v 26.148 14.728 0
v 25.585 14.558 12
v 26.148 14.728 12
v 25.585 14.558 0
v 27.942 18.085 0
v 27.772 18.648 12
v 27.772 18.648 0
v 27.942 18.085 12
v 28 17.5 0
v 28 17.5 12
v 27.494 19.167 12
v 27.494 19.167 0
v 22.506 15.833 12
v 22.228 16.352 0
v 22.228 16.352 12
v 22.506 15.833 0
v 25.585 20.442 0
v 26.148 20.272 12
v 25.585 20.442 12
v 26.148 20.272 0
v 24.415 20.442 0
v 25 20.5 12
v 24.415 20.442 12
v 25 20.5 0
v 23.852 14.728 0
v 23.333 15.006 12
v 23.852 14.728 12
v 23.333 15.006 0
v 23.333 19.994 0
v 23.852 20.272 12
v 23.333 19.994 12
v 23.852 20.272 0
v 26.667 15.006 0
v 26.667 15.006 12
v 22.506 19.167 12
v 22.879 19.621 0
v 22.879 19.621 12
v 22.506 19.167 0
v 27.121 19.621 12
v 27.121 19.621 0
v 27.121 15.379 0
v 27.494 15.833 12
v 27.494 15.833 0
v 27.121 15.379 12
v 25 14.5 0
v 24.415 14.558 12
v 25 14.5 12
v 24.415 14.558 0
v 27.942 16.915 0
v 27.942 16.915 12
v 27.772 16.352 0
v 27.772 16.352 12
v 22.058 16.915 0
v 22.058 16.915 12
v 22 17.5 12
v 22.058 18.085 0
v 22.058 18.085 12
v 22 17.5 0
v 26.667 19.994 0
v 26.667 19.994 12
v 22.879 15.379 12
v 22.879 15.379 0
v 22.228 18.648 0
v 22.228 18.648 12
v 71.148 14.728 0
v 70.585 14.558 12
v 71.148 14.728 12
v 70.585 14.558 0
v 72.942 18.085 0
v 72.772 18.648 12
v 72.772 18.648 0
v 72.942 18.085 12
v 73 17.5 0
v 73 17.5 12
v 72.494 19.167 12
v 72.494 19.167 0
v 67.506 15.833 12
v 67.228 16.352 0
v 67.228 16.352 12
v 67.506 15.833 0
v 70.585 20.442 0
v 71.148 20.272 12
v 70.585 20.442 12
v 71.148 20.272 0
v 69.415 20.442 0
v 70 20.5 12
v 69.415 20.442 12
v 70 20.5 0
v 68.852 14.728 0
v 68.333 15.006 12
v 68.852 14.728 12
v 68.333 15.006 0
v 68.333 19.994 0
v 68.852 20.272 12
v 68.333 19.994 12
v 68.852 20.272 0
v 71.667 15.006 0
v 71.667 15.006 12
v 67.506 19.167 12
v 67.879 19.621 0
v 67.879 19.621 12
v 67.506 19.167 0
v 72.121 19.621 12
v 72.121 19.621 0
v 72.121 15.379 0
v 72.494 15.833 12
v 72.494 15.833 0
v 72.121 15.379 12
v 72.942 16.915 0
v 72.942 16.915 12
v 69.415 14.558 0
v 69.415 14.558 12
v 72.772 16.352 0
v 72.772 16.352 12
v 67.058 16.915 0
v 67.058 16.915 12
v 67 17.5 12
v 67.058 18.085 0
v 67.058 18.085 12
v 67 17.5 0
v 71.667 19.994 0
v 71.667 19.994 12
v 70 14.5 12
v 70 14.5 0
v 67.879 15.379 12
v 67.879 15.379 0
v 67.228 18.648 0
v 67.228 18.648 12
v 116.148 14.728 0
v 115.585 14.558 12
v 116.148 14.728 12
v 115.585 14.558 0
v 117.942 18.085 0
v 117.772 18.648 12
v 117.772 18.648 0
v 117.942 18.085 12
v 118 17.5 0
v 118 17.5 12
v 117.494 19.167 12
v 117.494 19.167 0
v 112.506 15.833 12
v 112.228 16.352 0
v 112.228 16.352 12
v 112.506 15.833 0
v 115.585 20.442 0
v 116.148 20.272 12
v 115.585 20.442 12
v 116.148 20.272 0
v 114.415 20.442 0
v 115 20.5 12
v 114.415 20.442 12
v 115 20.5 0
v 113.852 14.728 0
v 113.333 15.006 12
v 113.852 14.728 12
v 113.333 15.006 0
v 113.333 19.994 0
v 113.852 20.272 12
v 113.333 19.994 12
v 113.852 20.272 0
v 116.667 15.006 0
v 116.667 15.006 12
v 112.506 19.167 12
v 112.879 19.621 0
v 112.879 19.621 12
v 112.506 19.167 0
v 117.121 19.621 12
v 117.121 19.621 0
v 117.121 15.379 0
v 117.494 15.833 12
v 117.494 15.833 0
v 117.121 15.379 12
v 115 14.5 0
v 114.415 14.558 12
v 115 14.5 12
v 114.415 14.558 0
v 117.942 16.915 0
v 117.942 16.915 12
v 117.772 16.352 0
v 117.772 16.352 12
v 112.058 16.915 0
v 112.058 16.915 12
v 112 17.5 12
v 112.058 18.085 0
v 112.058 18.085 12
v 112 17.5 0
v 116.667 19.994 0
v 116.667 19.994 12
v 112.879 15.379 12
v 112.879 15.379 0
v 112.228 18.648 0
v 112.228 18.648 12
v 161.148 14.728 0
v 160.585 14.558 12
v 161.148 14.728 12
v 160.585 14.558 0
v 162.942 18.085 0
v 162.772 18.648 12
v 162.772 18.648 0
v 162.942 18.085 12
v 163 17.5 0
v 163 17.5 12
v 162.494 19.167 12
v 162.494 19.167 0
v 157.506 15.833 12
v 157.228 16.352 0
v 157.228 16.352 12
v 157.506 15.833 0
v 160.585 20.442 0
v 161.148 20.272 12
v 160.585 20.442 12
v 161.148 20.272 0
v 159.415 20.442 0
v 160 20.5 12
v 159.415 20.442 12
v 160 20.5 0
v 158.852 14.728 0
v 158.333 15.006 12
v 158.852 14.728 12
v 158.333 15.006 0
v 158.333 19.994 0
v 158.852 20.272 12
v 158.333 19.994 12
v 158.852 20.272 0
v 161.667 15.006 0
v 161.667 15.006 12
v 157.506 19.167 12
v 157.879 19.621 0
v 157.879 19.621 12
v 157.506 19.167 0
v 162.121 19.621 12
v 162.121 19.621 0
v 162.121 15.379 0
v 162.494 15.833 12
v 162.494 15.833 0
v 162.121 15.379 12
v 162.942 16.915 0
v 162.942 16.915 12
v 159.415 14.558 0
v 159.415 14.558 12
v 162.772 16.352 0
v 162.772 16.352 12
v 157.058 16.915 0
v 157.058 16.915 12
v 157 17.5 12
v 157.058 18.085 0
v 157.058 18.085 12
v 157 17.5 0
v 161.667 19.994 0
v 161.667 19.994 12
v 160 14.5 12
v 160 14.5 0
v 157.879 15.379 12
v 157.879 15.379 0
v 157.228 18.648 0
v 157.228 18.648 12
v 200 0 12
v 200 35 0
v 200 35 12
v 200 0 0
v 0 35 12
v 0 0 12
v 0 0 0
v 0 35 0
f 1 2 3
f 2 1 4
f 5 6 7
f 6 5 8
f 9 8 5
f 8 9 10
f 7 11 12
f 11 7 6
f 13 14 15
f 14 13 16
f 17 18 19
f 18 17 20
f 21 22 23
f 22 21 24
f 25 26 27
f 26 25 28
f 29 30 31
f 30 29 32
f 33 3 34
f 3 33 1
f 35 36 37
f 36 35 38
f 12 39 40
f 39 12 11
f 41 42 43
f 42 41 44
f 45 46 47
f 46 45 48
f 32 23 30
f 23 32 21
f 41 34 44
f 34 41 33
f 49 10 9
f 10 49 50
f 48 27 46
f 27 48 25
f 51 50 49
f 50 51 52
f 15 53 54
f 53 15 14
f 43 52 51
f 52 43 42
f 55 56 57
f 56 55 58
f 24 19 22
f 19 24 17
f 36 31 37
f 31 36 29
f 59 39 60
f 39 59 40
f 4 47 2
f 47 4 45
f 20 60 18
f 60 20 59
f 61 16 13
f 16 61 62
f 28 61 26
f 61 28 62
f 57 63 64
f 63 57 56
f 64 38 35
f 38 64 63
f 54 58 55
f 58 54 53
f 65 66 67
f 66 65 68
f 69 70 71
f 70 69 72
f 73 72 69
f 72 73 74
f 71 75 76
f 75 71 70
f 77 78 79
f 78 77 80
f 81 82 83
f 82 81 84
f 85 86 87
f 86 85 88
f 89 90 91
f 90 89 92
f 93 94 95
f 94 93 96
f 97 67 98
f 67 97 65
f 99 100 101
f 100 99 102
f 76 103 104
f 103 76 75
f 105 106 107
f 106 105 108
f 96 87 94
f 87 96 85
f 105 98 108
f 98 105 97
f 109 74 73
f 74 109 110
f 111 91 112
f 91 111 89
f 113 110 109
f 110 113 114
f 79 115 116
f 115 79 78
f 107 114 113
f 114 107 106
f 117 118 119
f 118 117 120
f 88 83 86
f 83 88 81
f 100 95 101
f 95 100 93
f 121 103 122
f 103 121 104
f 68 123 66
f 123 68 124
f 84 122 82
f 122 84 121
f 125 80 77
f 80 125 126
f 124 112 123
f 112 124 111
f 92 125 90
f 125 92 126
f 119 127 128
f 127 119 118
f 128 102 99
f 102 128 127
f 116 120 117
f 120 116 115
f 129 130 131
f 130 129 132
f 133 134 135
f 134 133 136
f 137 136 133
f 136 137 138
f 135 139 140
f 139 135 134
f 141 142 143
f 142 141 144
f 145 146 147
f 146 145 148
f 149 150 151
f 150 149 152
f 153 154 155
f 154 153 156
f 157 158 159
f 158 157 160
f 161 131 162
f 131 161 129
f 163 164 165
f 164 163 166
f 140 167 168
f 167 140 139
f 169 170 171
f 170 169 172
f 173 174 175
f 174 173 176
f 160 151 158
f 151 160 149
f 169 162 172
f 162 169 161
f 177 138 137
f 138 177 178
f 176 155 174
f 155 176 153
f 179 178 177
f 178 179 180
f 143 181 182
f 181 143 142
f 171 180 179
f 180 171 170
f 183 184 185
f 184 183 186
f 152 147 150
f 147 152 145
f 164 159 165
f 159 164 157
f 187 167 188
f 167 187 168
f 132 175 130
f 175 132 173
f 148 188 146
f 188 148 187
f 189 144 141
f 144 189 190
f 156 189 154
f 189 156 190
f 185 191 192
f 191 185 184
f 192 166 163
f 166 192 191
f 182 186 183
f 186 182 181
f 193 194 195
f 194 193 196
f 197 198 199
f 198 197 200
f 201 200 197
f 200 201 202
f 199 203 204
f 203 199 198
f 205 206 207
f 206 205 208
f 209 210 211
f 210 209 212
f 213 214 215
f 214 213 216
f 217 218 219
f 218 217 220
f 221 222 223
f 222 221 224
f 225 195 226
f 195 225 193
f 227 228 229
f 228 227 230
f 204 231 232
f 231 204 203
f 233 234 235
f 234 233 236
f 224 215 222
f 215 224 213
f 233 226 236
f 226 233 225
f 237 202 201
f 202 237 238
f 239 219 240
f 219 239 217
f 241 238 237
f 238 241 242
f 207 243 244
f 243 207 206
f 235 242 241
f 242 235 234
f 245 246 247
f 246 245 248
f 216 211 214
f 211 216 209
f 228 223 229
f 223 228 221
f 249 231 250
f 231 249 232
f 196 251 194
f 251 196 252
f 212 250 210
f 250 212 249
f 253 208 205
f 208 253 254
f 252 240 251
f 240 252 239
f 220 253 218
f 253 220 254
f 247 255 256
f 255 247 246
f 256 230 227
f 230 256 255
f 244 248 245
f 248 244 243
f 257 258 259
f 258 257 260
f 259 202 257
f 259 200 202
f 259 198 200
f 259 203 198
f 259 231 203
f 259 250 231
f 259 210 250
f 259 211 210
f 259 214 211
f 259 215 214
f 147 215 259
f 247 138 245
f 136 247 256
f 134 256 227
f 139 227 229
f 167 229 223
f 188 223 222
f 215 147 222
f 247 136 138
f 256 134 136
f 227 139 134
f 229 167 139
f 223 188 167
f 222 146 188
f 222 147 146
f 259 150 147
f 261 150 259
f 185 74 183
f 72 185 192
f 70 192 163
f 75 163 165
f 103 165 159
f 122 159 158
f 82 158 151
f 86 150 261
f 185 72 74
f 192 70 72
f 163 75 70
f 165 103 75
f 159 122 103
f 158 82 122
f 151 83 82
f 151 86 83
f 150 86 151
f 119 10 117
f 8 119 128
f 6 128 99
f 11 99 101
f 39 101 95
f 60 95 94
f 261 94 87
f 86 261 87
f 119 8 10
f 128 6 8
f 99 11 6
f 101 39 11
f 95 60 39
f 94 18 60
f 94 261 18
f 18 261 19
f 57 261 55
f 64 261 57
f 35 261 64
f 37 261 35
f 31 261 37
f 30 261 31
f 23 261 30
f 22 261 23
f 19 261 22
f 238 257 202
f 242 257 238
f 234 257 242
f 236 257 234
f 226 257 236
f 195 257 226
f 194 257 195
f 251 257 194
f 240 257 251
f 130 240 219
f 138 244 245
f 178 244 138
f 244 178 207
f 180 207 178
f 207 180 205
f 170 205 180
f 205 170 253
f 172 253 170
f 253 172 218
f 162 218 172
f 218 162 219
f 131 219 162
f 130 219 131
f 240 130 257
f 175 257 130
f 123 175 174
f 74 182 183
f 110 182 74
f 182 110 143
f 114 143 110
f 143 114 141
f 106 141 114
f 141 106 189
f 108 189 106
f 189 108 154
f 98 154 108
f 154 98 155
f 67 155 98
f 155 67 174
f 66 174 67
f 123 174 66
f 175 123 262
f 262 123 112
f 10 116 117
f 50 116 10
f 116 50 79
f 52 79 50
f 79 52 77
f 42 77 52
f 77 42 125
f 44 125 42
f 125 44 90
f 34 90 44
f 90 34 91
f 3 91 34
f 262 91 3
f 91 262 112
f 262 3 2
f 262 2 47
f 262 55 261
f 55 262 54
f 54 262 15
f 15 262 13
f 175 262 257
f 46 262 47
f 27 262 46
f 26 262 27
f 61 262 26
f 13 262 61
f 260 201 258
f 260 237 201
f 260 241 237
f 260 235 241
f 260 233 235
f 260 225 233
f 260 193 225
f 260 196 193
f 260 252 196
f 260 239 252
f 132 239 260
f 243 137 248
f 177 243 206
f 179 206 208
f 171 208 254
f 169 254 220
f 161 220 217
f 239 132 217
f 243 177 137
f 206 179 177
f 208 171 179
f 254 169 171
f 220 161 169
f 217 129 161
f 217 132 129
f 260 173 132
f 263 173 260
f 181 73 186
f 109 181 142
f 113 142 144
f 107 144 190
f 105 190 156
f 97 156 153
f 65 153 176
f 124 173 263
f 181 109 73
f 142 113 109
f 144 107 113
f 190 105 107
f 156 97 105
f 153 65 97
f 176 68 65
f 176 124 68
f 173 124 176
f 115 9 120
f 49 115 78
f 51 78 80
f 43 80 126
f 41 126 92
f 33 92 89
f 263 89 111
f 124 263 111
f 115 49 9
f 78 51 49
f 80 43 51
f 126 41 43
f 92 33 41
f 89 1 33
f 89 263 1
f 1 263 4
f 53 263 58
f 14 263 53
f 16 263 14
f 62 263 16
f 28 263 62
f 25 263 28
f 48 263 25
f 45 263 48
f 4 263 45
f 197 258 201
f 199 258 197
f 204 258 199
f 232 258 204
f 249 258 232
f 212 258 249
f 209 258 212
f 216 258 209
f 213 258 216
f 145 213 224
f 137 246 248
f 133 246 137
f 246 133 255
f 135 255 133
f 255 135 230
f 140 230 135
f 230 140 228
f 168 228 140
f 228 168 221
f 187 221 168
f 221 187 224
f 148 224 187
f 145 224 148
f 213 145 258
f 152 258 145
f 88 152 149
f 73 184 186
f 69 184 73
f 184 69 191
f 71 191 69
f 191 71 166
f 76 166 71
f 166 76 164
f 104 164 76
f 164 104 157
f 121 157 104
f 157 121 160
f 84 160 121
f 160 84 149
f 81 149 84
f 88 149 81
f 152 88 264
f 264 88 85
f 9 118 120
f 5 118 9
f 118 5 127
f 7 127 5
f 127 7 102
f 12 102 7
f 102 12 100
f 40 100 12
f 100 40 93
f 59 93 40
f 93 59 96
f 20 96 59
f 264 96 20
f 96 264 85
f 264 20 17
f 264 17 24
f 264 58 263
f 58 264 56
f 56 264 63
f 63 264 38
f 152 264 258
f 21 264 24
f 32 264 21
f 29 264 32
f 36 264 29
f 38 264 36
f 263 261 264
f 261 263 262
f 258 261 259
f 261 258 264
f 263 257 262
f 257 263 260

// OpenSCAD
$fn = 32;

// ----------------------------------------------------------------------
// Long rail: 200-250 mm mounting rail
// ----------------------------------------------------------------------

// --- parameters (mm) ---
rail_l = 200;             // rail length, X
rail_w = 35;              // rail width, Y
rail_t = 12;              // rail thickness, Z
hole_d = 6;               // mounting hole diameter
hole_start = 25;          // first hole offset from the end
hole_pitch = 45;          // hole pitch
holes = 4;                // number of holes

difference() {
  cube([rail_l, rail_w, rail_t]);
  for (i = [0 : holes - 1])
    translate([hole_start + i * hole_pitch, rail_w / 2, -1])
      cylinder(h = rail_t + 2, d = hole_d);
}
